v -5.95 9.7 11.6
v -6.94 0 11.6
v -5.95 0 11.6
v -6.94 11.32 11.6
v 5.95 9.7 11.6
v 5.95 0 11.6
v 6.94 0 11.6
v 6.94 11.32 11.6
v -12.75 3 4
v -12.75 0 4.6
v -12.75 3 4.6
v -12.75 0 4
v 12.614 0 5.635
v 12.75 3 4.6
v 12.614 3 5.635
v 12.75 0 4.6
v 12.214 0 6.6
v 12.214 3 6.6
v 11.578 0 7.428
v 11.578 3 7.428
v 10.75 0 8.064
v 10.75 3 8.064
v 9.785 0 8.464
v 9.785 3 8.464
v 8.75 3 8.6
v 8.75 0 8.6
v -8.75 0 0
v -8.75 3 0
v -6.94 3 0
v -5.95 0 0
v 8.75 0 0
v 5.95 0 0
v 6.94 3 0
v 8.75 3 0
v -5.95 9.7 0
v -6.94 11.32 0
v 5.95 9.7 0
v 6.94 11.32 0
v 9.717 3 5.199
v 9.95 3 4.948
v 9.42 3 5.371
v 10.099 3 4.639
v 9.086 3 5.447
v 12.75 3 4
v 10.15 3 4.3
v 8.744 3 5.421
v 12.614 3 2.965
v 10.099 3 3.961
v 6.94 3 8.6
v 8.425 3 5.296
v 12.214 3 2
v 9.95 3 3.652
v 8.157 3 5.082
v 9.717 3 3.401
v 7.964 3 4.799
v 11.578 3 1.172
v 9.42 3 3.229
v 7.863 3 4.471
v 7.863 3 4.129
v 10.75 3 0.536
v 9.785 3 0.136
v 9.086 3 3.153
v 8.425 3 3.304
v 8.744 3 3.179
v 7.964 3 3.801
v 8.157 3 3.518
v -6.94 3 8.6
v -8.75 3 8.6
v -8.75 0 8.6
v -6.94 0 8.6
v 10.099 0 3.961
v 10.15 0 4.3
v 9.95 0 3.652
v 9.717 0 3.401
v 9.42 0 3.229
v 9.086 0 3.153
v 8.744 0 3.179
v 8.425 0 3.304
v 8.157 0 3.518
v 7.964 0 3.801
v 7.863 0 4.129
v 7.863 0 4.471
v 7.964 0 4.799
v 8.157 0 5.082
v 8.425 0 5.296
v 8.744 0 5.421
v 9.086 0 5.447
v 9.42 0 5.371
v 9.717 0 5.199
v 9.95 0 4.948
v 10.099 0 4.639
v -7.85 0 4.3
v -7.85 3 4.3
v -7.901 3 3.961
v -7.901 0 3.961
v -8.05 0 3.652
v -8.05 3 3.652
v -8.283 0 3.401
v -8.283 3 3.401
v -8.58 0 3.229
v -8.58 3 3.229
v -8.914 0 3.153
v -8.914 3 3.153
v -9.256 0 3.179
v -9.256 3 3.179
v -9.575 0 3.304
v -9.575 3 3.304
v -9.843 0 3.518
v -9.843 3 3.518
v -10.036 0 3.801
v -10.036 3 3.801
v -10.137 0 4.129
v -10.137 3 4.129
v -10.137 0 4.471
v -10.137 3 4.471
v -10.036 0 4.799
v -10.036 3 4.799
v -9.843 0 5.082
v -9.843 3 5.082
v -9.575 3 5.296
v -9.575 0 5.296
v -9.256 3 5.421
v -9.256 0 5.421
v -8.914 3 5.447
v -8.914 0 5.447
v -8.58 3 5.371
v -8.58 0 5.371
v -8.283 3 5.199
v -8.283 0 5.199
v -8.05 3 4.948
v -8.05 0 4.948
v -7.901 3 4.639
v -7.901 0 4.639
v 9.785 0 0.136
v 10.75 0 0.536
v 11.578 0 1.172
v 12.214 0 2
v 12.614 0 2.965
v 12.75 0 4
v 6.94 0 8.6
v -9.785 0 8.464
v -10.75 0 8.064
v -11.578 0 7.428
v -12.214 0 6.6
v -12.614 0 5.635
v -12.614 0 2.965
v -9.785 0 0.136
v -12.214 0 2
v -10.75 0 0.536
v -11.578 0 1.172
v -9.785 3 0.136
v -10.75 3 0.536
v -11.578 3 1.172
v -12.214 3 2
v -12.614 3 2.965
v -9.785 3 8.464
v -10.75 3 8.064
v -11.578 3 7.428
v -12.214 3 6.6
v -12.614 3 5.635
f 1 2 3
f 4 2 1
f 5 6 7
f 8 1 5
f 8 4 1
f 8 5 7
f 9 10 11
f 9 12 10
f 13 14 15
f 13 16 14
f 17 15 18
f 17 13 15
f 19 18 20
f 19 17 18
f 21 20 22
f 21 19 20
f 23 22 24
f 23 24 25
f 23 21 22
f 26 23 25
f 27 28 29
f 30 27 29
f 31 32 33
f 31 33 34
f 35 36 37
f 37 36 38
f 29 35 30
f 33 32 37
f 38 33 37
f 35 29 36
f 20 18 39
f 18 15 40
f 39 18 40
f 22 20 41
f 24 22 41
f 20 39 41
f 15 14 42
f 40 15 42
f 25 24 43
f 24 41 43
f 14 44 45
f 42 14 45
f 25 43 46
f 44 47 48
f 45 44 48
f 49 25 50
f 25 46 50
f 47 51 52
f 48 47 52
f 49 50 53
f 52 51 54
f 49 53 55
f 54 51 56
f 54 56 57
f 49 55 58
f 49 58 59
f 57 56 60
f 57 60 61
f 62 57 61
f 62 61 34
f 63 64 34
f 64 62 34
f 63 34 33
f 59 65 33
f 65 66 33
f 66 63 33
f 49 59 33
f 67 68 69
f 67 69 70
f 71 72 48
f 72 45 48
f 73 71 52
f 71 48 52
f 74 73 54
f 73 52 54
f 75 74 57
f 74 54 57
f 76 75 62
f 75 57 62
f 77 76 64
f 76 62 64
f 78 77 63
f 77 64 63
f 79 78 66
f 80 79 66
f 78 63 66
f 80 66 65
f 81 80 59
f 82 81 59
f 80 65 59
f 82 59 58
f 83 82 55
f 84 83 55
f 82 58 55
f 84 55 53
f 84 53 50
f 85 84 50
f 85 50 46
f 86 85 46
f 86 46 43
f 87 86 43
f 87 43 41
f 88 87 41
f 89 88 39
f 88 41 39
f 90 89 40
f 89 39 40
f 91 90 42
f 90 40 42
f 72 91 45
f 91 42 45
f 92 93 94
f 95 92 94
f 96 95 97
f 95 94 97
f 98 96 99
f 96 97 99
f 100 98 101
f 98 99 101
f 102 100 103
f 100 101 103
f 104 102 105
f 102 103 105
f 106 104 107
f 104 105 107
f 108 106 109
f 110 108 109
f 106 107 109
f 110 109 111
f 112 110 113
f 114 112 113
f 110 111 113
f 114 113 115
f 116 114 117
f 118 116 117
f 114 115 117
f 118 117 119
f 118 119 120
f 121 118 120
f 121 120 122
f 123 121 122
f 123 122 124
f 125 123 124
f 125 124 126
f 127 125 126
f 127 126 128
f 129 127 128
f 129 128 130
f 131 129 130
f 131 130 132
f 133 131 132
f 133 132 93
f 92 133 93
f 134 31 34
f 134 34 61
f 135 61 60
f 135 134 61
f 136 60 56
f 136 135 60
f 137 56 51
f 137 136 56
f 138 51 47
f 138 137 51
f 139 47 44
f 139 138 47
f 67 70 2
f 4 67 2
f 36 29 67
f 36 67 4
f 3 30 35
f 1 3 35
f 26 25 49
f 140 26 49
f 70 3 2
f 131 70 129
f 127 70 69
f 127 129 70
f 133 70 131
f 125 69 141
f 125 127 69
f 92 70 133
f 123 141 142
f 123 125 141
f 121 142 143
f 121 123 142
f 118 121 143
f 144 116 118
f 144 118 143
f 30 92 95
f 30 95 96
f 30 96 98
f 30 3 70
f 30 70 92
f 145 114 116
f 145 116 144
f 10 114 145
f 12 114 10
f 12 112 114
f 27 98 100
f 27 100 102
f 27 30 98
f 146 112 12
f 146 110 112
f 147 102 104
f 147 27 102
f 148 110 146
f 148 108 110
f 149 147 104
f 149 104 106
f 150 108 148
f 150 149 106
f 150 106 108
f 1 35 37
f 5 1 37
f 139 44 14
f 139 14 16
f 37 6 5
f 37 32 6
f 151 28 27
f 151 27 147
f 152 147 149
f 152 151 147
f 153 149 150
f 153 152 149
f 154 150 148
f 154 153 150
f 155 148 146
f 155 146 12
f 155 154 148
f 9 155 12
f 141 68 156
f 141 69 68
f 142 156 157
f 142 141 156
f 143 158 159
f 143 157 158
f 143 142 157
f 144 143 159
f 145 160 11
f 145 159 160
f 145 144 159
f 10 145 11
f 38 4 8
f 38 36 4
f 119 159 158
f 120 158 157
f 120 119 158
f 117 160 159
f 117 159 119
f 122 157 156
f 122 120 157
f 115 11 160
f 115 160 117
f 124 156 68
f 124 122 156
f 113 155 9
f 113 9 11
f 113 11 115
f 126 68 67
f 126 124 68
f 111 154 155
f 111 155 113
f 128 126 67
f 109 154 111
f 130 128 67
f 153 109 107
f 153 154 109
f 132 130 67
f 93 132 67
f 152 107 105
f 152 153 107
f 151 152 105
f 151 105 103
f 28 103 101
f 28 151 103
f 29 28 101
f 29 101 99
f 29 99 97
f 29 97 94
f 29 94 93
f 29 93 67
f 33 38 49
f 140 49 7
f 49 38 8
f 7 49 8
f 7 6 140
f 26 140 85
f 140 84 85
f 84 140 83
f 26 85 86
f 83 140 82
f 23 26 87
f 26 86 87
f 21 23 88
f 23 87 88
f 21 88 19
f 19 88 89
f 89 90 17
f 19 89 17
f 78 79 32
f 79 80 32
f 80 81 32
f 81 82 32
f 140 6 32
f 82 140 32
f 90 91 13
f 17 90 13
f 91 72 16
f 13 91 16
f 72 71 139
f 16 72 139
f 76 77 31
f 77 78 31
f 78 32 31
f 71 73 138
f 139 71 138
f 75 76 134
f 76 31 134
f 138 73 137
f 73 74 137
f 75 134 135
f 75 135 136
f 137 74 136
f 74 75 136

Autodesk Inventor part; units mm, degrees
ref_plane "YZ Plane" through (0, 0, 0) normal (1, 0, 0) x (0, 1, 0)
ref_plane "XZ Plane" through (0, 0, 0) normal (0, 1, 0) x (-1, 0, 0)
ref_plane "XY Plane" through (0, 0, 0) normal (0, 0, 1) x (1, 0, 0)
sketch "Sketch1" plane through (0, 0, 0) normal (0, 0, 1) x (1, 0, 0)
  line L0 (0, 0) -> (12.75, 0)
  line L1 (0, 0) -> (-12.75, 0)
  line L2 (-12.75, 0) -> (-12.75, 11.32)
  line L3 (-12.75, 11.32) -> (12.75, 11.32)
  line L4 (12.75, 11.32) -> (12.75, 0)
  line L5 (0, 0) -> (-5.95, 0)
  line L6 (0, 0) -> (5.95, 0)
  line L7 (12.75, 0) -> (6.94, 0)
  line L8 (0, 11.32) -> (0, 9.7)
  line L9 (0, 9.7) -> (6.94, 9.7)
  line L10 (6.94, 9.7) -> (6.94, 0)
  line L11 (0, 0) -> (0, 11.32)
  line L12 (0, 9.7) -> (-6.94, 9.7)
  line L13 (-6.94, 9.7) -> (-6.94, 0)
  line L14 (-12.75, 0) -> (-6.94, 0)
  line L15 (12.75, 0) -> (12.75, 3)
  line L16 (12.75, 3) -> (6.94, 3)
  line L17 (-12.75, 3) -> (-6.94, 3)
  line L18 (-6.94, 9.7) -> (-6.94, 11.32)
  line L19 (6.94, 9.7) -> (6.94, 11.32)
  line L20 (5.95, 0) -> (5.95, 9.7)
  line L21 (-5.95, 0) -> (-5.95, 9.7)
  dimension "d0" = 12.75
  dimension "d1" = 12.75
  dimension "d2" = 11.32
  dimension "d3" = 25.5
  dimension "d4" = 5.95
  dimension "d5" = 5.95
  dimension "d6" = 5.81
  dimension "d7" = 1.62
  dimension "d8" = 5.81
  dimension "d9" = 3
extrude "Extrusion1" add sketch "Sketch1" along normal blind 11.6 contours L20 L9 L10 L0 | L1 L13 L12 L21 | L12 L18 L3 L8 | L8 L3 L19 L9 | L10 L16 L4 L0 | L1 L2 L17 L13
sketch "Sketch2" plane through (6.94, 3, 0) normal (0, 1, 0) x (1, 0, 0)
  line L0 (-6.94, 0) -> (-6.94, -11.6)
  line L1 (-12.89, -11.6) -> (-0.99, -11.6) projected
  line L2 (-0.99, -11.6) -> (5.81, -11.6) projected
  line L3 (5.81, -11.6) -> (5.81, -8.6)
  line L4 (5.81, -8.6) -> (0, -8.6)
  line L5 (0, 0) -> (0, -11.6) projected
  line L6 (0, -11.6) -> (5.81, -11.6)
  line L7 (2.905, -8.6) -> (2.905, 0)
  line L8 (-0.99, 0) -> (5.81, 0) projected
  line L9 (5.81, 0) -> (5.81, -11.6) projected
  line L10 (5.81, -8.6) -> (5.81, 0)
  line L11 (-12.89, -11.6) -> (-19.69, -11.6)
  line L12 (-19.69, -11.6) -> (-19.69, -8.6)
  line L13 (-19.69, -8.6) -> (-13.88, -8.6)
  line L14 (-13.88, 0) -> (-13.88, -11.6)
  line L15 (-16.785, -8.6) -> (-16.785, 0)
  dimension "d12" = 3
extrude "Extrusion2" cut sketch "Sketch2" against normal blind 11.6 contours L5 L4 L3 L2 | L11 L12 L13 L14
fillet "Fillet1" radius 4 4 edges at (-12.75, 1.5, 0) (-12.75, 1.5, 8.6) (12.75, 1.5, 0) (12.75, 1.5, 8.6)
sketch "Sketch4" plane through (6.94, 3, 8.6) normal (0, 1, 0) x (1, 0, 0)
  line L0 (5.81, 4.6) -> (5.81, 4) projected
  line L1 (5.81, 4.3) -> (-19.69, 4.3)
  line L2 (-19.69, 4.6) -> (-19.69, 4) projected
  line L3 (-6.94, 8.6) -> (-6.94, 4.3)
  line L4 (-6.94, 4.3) -> (2.06, 4.3)
  line L5 (-6.94, 4.3) -> (-15.94, 4.3)
  circle A0 centre (-15.94, 4.3) radius 1.15
  circle A1 centre (2.06, 4.3) radius 1.15
  dimension "d16" = 9
  dimension "d17" = 9
  dimension "d18" = 2.3
  dimension "d19" = 2.3
extrude "Extrusion3" cut sketch "Sketch4" against normal blind 11.6
properties part number "SoporteMotor_3.0"
